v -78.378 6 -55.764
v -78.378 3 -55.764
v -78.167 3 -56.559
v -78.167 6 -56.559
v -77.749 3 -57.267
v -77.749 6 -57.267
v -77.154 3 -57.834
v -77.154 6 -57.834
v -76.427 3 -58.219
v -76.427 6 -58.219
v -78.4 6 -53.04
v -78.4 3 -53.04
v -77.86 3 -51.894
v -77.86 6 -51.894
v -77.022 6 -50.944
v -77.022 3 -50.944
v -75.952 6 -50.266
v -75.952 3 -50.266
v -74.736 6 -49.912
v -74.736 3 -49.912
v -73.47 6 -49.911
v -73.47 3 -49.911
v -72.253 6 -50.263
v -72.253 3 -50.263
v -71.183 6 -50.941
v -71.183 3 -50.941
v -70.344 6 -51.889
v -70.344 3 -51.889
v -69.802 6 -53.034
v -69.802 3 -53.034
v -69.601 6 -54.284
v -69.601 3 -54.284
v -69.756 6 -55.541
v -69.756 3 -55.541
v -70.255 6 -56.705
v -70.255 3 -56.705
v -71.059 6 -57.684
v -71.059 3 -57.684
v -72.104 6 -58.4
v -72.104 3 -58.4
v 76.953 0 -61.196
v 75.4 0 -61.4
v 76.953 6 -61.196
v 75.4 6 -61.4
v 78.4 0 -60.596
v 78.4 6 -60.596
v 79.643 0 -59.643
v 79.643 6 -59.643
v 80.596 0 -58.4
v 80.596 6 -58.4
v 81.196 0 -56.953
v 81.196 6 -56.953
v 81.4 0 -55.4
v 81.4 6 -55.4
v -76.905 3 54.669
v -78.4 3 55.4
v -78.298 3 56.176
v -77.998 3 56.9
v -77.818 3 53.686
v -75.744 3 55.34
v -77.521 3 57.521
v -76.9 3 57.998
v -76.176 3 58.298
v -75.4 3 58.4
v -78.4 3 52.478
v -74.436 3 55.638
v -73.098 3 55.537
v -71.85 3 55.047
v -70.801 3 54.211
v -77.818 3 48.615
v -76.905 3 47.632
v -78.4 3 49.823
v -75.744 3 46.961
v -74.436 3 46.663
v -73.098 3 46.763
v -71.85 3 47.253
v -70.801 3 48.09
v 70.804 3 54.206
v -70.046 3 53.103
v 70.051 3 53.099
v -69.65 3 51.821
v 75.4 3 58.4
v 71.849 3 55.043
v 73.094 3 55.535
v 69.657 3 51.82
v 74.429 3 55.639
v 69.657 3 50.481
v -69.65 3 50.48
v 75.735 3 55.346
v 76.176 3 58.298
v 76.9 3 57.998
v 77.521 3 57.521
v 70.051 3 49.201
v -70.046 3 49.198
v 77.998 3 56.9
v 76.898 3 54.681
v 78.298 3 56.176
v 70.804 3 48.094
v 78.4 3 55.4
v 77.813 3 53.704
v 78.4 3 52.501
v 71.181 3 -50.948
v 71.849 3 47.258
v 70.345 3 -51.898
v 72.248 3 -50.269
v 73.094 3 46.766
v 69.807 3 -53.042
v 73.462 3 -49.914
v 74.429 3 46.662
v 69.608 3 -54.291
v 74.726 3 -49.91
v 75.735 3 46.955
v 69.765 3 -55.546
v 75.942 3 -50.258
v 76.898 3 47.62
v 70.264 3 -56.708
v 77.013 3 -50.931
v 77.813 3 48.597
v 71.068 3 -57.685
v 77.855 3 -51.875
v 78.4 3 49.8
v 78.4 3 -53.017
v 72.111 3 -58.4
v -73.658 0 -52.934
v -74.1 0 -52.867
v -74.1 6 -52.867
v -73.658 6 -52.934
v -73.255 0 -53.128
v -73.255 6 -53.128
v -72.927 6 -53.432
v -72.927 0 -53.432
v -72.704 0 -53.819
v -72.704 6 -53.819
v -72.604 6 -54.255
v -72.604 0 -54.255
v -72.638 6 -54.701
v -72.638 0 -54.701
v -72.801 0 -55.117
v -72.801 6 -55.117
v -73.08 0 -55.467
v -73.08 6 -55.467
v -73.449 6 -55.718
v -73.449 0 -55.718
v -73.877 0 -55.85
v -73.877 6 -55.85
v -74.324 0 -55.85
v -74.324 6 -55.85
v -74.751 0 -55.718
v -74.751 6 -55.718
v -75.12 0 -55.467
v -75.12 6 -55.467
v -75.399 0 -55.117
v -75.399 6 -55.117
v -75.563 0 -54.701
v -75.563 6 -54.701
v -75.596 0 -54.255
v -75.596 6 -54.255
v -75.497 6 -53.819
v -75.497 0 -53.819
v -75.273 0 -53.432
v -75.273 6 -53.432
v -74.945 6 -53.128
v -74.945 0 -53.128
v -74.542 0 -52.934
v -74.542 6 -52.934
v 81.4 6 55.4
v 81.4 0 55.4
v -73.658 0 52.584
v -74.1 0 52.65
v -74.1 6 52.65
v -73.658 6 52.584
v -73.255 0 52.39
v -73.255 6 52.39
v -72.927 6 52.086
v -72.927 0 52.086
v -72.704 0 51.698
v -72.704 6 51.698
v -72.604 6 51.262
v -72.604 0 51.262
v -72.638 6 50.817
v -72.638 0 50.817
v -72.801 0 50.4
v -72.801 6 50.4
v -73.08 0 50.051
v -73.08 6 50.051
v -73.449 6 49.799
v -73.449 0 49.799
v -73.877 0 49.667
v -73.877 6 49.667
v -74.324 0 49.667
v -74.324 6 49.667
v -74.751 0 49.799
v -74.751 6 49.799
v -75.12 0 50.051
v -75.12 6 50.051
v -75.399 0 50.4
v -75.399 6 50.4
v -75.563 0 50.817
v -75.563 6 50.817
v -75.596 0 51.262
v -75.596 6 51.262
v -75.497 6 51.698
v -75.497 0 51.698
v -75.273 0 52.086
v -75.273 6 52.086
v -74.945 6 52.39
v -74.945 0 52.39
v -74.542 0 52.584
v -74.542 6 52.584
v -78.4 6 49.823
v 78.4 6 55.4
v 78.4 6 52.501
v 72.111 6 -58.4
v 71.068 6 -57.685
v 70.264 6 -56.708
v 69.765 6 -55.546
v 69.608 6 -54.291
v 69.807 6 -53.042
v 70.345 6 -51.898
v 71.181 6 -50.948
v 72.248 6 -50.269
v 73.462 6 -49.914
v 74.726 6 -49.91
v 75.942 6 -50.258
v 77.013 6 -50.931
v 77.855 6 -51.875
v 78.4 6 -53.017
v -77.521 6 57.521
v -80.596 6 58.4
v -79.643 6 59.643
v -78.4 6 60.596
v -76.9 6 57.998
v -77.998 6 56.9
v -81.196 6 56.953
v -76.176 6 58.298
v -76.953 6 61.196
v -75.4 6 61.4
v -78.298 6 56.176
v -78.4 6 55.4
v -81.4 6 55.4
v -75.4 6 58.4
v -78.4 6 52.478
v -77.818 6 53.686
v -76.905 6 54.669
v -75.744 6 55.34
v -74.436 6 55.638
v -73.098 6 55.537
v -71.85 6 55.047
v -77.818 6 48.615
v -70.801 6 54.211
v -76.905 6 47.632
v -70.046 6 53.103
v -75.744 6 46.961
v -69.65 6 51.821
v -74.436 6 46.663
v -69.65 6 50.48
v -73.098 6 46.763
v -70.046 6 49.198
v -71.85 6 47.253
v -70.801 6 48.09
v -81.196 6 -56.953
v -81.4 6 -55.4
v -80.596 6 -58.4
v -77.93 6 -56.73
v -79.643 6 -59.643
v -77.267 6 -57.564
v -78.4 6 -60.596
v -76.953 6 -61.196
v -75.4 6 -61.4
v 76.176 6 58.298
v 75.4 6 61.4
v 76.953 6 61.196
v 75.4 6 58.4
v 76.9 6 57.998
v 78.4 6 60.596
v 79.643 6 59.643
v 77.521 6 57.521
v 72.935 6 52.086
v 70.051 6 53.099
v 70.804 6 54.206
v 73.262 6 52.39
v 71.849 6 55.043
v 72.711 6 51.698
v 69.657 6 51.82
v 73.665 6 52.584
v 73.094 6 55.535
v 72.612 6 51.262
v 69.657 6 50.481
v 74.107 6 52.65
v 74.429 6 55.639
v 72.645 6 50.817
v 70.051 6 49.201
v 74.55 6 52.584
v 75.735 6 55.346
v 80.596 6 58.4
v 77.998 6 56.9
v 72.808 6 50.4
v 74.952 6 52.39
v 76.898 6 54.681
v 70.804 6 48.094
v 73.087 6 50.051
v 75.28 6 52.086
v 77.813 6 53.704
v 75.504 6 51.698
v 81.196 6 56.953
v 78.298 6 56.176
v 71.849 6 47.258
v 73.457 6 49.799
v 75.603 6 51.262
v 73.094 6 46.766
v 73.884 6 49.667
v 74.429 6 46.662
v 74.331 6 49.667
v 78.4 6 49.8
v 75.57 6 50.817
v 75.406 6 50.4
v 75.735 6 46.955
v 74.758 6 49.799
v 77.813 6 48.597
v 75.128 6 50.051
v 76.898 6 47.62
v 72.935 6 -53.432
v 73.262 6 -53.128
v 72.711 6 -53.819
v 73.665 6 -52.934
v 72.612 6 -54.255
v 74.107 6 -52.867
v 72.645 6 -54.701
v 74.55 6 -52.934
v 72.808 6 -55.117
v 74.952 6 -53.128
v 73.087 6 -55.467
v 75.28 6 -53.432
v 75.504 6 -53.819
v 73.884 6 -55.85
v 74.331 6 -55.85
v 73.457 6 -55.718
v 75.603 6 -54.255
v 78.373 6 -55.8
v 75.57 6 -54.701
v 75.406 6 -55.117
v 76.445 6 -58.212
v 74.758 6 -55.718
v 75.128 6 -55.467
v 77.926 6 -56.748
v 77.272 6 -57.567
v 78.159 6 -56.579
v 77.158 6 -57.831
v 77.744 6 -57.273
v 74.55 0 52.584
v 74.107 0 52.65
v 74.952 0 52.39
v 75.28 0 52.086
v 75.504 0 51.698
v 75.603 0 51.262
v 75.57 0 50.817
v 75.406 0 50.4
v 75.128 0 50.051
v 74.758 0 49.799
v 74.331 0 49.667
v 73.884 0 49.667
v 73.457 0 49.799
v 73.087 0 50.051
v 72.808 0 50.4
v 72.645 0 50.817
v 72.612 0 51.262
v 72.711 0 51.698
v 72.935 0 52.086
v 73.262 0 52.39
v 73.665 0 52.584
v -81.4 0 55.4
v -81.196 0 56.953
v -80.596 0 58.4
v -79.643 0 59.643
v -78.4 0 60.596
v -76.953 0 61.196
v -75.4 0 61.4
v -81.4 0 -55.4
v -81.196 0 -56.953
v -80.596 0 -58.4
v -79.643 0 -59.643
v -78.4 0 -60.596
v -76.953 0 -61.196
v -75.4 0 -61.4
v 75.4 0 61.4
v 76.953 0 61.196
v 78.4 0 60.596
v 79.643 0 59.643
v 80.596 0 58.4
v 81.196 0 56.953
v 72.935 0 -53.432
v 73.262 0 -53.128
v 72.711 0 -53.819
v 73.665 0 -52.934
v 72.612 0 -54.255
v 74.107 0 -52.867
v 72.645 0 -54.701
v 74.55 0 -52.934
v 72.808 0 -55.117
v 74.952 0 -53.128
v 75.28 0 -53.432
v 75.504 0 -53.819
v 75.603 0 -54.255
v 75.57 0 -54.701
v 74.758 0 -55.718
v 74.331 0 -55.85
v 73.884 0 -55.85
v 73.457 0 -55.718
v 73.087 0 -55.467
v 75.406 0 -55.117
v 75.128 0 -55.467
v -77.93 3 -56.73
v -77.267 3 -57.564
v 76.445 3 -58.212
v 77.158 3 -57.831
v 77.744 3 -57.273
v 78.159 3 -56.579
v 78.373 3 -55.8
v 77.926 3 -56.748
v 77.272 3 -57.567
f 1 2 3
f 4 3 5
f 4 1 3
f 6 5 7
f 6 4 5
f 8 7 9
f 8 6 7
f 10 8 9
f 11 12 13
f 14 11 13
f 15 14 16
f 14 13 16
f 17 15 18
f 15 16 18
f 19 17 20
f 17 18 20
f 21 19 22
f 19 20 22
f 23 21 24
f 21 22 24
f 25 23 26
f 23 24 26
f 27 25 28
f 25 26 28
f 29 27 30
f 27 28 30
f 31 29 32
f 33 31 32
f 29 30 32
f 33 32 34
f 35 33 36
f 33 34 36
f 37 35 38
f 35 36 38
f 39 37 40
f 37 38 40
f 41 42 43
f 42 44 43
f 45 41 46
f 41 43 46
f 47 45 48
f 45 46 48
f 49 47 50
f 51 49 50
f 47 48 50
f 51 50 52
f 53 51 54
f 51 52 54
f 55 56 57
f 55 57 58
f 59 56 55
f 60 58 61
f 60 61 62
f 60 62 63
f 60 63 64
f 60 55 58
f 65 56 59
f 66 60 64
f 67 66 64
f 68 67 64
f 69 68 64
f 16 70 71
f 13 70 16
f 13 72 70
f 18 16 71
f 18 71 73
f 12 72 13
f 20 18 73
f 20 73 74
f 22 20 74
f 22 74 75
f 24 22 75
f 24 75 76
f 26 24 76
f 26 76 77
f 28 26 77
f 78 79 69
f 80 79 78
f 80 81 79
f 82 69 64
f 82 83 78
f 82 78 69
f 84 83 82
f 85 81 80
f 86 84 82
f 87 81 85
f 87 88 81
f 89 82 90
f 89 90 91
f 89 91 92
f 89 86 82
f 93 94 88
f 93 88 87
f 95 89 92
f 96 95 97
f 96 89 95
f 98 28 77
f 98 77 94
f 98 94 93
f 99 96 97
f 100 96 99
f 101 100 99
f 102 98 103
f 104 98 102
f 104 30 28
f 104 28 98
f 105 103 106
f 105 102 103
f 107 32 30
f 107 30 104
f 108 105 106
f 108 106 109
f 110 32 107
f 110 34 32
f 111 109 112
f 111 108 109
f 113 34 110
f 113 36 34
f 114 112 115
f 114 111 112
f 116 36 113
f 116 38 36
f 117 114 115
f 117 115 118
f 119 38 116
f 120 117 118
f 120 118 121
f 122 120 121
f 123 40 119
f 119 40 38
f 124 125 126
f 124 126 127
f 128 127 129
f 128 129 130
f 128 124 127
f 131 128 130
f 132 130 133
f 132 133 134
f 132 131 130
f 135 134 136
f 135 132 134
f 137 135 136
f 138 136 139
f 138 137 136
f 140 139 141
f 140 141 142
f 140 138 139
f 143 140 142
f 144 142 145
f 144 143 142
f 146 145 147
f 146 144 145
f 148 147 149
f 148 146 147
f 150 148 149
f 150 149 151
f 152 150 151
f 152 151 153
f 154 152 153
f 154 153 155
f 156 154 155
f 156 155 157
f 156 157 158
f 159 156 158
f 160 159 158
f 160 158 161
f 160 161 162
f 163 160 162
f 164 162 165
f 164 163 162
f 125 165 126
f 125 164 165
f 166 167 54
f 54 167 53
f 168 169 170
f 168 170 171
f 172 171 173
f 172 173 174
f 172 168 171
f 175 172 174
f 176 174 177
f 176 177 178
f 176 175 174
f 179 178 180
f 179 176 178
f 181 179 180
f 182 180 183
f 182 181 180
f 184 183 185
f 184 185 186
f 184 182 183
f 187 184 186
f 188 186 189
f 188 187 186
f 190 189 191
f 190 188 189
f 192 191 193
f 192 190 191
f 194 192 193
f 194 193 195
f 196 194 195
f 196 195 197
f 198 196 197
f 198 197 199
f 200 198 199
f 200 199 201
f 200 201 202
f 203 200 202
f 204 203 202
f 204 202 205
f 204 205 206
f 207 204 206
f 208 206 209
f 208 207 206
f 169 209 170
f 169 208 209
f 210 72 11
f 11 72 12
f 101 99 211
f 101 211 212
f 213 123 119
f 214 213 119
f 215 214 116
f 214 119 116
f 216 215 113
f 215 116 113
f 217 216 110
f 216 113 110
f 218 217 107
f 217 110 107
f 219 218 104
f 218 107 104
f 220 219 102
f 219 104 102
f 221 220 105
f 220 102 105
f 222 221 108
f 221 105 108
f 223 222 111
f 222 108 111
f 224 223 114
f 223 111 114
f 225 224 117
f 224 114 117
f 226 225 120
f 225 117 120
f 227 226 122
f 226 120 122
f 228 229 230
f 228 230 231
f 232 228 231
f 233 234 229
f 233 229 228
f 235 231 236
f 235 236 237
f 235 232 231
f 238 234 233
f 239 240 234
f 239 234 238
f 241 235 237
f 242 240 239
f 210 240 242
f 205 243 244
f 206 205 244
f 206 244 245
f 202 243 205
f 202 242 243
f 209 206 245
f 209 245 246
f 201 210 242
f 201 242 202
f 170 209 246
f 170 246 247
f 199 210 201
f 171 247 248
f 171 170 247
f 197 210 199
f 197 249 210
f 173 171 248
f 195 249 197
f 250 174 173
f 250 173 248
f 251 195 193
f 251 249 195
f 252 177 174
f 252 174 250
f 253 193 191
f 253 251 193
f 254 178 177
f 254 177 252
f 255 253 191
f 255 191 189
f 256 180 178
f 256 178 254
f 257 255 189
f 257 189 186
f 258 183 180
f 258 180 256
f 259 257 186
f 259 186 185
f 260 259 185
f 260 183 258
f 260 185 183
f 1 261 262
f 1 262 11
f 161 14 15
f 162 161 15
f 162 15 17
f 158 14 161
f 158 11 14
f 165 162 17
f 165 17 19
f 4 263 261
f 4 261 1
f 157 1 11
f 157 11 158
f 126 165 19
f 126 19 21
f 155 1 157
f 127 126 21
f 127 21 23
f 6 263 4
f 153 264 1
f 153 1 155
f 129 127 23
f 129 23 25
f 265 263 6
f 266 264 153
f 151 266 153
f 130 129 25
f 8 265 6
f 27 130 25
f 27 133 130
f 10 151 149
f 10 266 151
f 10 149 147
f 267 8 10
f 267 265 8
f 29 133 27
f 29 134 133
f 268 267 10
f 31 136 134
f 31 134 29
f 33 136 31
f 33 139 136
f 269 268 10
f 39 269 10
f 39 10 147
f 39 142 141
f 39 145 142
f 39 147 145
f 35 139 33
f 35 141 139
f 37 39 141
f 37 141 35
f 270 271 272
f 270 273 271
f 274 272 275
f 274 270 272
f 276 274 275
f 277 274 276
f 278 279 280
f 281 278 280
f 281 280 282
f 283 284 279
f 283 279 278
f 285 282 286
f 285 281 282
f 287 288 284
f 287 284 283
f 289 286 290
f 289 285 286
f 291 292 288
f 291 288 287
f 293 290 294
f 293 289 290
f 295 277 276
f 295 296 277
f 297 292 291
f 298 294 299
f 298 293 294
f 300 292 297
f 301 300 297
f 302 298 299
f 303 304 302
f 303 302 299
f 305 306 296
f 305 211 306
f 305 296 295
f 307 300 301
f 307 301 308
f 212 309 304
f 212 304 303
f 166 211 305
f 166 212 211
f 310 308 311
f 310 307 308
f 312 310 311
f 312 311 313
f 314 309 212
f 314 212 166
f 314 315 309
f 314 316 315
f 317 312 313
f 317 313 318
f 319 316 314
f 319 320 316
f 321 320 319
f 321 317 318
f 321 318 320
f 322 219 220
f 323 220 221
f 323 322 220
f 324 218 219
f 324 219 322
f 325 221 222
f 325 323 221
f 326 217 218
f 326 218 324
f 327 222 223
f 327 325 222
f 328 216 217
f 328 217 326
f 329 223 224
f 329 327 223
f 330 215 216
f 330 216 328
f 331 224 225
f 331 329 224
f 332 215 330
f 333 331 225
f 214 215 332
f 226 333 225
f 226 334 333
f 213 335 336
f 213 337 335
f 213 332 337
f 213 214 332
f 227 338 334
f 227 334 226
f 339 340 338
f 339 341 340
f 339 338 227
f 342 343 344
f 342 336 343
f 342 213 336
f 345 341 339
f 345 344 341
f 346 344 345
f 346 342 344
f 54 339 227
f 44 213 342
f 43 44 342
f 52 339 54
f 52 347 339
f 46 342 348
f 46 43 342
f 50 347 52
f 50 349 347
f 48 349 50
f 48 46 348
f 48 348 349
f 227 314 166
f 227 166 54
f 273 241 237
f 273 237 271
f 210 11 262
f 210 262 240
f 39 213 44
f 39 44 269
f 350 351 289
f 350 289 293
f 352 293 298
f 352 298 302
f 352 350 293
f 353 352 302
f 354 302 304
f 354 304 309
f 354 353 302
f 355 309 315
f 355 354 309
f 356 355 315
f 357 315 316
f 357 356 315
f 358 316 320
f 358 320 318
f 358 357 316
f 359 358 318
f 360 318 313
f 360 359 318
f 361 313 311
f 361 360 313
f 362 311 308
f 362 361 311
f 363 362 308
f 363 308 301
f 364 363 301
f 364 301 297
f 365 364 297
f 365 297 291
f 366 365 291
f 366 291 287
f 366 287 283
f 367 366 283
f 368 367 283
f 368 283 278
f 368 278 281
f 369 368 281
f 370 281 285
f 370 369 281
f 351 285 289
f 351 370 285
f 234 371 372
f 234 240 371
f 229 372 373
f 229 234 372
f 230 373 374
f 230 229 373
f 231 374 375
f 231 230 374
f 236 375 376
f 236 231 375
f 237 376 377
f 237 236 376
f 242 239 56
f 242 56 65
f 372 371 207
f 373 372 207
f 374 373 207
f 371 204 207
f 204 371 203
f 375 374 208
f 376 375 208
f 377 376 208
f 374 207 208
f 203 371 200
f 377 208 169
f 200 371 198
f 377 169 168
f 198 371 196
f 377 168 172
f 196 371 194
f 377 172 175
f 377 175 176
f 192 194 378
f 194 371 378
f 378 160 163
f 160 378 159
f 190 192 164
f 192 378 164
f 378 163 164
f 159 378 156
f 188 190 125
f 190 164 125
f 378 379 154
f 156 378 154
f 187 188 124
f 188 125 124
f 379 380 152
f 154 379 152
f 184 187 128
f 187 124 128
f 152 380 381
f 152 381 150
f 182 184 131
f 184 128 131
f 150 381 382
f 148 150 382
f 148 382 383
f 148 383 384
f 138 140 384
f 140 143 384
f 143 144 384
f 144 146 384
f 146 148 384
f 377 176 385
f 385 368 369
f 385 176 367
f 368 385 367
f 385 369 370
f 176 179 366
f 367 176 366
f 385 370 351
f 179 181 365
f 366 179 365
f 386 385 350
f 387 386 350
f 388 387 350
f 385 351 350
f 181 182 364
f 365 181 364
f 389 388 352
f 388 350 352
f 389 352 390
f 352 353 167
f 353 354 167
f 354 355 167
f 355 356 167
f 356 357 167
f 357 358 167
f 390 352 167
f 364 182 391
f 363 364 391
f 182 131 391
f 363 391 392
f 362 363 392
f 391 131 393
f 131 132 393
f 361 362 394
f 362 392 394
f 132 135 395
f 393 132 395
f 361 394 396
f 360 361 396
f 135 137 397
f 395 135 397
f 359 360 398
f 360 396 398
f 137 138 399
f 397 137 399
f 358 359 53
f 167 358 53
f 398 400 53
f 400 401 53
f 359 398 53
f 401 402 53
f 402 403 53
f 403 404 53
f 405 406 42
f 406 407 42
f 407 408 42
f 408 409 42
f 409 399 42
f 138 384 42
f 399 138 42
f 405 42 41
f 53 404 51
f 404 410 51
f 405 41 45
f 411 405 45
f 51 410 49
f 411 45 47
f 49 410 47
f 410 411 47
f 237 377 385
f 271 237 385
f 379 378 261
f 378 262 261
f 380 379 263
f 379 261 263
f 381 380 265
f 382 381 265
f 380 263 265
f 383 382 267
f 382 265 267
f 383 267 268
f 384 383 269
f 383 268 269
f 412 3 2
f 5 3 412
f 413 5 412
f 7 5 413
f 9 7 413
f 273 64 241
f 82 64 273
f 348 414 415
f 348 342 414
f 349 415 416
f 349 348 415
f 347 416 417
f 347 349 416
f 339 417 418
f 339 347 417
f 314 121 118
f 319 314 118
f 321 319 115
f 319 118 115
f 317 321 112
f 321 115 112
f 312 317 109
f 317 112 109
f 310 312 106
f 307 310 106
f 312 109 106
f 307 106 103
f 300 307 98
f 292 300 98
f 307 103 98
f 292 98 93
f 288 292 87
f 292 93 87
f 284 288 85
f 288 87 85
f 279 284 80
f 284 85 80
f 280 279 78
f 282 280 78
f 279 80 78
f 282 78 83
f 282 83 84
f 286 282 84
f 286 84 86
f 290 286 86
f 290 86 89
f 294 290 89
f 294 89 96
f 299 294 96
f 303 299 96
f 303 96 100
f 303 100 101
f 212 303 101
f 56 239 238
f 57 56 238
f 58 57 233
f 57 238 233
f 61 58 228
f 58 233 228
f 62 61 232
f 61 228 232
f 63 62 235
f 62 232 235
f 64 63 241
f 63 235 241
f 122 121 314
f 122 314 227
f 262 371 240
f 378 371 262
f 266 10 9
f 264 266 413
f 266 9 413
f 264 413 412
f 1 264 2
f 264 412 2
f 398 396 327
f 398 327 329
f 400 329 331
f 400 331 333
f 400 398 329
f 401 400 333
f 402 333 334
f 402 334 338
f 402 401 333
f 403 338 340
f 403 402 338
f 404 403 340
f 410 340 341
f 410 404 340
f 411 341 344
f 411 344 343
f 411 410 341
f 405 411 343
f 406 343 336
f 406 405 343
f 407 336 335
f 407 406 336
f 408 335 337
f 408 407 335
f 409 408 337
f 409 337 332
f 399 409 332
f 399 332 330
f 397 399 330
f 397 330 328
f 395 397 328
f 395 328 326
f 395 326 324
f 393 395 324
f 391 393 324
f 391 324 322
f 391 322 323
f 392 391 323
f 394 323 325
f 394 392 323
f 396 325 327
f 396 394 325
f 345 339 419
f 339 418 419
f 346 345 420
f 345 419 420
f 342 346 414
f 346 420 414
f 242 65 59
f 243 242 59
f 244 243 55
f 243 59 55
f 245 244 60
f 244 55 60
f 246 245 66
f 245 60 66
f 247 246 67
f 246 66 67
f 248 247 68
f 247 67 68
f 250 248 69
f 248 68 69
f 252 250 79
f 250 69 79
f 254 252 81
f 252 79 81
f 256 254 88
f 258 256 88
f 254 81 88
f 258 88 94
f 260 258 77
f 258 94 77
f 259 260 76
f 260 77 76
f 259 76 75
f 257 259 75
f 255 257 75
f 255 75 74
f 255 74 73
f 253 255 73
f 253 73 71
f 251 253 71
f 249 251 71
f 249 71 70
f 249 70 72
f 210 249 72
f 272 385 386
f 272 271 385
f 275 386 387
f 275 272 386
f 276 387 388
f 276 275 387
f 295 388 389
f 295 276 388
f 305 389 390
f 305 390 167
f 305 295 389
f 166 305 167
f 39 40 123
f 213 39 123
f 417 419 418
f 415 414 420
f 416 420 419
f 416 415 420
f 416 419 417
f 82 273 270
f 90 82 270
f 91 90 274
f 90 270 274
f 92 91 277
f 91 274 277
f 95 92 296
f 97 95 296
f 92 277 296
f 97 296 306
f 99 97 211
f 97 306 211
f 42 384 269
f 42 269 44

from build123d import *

# Parameters (mm, degrees)
SKETCH1_W           = 162.8
SKETCH1_H           = 122.8
SKETCH1_R           = 1.5
BOSS_EXTRUDE1_DEPTH = 6
FILLET1_R           = 6
SHELL5_T            = -3


with BuildPart() as part:
    # Sketch1 → Boss-Extrude1 (new body)
    with BuildSketch(Plane(origin=(0, 0, 0), x_dir=(1, 0, 0), z_dir=(0, 1, 0))):
        Rectangle(SKETCH1_W, SKETCH1_H)
        with Locations(Location((-74.100221616, 54.366983464, 0), (0, 0, 270))):
            Circle(SKETCH1_R, mode=Mode.SUBTRACT)
        with Locations(Location((74.107411227, 54.366983464, 0), (0, 0, 270))):
            Circle(SKETCH1_R, mode=Mode.SUBTRACT)
        with Locations(Location((74.107411227, -51.150377924, 0), (0, 0, 270))):
            Circle(SKETCH1_R, mode=Mode.SUBTRACT)
        with Locations(Location((-74.100221616, -51.150377924, 0), (0, 0, 270))):
            Circle(SKETCH1_R, mode=Mode.SUBTRACT)
    extrude(amount=BOSS_EXTRUDE1_DEPTH)

    # Fillet1
    fillet1_edges = [part.edges().sort_by_distance(p)[0] for p in [
        (81.4, 3, 61.4),
        (-81.4, 3, 61.4),
        (-81.4, 3, -61.4),
        (81.4, 3, -61.4),
    ]]
    fillet(fillet1_edges, radius=FILLET1_R)

    # Shell5
    shell5_openings = [part.faces().sort_by_distance(p)[0] for p in [
        (-5.099e-06, 6, 0.002281365),
    ]]
    offset(amount=SHELL5_T, openings=shell5_openings)


solid = part.part
